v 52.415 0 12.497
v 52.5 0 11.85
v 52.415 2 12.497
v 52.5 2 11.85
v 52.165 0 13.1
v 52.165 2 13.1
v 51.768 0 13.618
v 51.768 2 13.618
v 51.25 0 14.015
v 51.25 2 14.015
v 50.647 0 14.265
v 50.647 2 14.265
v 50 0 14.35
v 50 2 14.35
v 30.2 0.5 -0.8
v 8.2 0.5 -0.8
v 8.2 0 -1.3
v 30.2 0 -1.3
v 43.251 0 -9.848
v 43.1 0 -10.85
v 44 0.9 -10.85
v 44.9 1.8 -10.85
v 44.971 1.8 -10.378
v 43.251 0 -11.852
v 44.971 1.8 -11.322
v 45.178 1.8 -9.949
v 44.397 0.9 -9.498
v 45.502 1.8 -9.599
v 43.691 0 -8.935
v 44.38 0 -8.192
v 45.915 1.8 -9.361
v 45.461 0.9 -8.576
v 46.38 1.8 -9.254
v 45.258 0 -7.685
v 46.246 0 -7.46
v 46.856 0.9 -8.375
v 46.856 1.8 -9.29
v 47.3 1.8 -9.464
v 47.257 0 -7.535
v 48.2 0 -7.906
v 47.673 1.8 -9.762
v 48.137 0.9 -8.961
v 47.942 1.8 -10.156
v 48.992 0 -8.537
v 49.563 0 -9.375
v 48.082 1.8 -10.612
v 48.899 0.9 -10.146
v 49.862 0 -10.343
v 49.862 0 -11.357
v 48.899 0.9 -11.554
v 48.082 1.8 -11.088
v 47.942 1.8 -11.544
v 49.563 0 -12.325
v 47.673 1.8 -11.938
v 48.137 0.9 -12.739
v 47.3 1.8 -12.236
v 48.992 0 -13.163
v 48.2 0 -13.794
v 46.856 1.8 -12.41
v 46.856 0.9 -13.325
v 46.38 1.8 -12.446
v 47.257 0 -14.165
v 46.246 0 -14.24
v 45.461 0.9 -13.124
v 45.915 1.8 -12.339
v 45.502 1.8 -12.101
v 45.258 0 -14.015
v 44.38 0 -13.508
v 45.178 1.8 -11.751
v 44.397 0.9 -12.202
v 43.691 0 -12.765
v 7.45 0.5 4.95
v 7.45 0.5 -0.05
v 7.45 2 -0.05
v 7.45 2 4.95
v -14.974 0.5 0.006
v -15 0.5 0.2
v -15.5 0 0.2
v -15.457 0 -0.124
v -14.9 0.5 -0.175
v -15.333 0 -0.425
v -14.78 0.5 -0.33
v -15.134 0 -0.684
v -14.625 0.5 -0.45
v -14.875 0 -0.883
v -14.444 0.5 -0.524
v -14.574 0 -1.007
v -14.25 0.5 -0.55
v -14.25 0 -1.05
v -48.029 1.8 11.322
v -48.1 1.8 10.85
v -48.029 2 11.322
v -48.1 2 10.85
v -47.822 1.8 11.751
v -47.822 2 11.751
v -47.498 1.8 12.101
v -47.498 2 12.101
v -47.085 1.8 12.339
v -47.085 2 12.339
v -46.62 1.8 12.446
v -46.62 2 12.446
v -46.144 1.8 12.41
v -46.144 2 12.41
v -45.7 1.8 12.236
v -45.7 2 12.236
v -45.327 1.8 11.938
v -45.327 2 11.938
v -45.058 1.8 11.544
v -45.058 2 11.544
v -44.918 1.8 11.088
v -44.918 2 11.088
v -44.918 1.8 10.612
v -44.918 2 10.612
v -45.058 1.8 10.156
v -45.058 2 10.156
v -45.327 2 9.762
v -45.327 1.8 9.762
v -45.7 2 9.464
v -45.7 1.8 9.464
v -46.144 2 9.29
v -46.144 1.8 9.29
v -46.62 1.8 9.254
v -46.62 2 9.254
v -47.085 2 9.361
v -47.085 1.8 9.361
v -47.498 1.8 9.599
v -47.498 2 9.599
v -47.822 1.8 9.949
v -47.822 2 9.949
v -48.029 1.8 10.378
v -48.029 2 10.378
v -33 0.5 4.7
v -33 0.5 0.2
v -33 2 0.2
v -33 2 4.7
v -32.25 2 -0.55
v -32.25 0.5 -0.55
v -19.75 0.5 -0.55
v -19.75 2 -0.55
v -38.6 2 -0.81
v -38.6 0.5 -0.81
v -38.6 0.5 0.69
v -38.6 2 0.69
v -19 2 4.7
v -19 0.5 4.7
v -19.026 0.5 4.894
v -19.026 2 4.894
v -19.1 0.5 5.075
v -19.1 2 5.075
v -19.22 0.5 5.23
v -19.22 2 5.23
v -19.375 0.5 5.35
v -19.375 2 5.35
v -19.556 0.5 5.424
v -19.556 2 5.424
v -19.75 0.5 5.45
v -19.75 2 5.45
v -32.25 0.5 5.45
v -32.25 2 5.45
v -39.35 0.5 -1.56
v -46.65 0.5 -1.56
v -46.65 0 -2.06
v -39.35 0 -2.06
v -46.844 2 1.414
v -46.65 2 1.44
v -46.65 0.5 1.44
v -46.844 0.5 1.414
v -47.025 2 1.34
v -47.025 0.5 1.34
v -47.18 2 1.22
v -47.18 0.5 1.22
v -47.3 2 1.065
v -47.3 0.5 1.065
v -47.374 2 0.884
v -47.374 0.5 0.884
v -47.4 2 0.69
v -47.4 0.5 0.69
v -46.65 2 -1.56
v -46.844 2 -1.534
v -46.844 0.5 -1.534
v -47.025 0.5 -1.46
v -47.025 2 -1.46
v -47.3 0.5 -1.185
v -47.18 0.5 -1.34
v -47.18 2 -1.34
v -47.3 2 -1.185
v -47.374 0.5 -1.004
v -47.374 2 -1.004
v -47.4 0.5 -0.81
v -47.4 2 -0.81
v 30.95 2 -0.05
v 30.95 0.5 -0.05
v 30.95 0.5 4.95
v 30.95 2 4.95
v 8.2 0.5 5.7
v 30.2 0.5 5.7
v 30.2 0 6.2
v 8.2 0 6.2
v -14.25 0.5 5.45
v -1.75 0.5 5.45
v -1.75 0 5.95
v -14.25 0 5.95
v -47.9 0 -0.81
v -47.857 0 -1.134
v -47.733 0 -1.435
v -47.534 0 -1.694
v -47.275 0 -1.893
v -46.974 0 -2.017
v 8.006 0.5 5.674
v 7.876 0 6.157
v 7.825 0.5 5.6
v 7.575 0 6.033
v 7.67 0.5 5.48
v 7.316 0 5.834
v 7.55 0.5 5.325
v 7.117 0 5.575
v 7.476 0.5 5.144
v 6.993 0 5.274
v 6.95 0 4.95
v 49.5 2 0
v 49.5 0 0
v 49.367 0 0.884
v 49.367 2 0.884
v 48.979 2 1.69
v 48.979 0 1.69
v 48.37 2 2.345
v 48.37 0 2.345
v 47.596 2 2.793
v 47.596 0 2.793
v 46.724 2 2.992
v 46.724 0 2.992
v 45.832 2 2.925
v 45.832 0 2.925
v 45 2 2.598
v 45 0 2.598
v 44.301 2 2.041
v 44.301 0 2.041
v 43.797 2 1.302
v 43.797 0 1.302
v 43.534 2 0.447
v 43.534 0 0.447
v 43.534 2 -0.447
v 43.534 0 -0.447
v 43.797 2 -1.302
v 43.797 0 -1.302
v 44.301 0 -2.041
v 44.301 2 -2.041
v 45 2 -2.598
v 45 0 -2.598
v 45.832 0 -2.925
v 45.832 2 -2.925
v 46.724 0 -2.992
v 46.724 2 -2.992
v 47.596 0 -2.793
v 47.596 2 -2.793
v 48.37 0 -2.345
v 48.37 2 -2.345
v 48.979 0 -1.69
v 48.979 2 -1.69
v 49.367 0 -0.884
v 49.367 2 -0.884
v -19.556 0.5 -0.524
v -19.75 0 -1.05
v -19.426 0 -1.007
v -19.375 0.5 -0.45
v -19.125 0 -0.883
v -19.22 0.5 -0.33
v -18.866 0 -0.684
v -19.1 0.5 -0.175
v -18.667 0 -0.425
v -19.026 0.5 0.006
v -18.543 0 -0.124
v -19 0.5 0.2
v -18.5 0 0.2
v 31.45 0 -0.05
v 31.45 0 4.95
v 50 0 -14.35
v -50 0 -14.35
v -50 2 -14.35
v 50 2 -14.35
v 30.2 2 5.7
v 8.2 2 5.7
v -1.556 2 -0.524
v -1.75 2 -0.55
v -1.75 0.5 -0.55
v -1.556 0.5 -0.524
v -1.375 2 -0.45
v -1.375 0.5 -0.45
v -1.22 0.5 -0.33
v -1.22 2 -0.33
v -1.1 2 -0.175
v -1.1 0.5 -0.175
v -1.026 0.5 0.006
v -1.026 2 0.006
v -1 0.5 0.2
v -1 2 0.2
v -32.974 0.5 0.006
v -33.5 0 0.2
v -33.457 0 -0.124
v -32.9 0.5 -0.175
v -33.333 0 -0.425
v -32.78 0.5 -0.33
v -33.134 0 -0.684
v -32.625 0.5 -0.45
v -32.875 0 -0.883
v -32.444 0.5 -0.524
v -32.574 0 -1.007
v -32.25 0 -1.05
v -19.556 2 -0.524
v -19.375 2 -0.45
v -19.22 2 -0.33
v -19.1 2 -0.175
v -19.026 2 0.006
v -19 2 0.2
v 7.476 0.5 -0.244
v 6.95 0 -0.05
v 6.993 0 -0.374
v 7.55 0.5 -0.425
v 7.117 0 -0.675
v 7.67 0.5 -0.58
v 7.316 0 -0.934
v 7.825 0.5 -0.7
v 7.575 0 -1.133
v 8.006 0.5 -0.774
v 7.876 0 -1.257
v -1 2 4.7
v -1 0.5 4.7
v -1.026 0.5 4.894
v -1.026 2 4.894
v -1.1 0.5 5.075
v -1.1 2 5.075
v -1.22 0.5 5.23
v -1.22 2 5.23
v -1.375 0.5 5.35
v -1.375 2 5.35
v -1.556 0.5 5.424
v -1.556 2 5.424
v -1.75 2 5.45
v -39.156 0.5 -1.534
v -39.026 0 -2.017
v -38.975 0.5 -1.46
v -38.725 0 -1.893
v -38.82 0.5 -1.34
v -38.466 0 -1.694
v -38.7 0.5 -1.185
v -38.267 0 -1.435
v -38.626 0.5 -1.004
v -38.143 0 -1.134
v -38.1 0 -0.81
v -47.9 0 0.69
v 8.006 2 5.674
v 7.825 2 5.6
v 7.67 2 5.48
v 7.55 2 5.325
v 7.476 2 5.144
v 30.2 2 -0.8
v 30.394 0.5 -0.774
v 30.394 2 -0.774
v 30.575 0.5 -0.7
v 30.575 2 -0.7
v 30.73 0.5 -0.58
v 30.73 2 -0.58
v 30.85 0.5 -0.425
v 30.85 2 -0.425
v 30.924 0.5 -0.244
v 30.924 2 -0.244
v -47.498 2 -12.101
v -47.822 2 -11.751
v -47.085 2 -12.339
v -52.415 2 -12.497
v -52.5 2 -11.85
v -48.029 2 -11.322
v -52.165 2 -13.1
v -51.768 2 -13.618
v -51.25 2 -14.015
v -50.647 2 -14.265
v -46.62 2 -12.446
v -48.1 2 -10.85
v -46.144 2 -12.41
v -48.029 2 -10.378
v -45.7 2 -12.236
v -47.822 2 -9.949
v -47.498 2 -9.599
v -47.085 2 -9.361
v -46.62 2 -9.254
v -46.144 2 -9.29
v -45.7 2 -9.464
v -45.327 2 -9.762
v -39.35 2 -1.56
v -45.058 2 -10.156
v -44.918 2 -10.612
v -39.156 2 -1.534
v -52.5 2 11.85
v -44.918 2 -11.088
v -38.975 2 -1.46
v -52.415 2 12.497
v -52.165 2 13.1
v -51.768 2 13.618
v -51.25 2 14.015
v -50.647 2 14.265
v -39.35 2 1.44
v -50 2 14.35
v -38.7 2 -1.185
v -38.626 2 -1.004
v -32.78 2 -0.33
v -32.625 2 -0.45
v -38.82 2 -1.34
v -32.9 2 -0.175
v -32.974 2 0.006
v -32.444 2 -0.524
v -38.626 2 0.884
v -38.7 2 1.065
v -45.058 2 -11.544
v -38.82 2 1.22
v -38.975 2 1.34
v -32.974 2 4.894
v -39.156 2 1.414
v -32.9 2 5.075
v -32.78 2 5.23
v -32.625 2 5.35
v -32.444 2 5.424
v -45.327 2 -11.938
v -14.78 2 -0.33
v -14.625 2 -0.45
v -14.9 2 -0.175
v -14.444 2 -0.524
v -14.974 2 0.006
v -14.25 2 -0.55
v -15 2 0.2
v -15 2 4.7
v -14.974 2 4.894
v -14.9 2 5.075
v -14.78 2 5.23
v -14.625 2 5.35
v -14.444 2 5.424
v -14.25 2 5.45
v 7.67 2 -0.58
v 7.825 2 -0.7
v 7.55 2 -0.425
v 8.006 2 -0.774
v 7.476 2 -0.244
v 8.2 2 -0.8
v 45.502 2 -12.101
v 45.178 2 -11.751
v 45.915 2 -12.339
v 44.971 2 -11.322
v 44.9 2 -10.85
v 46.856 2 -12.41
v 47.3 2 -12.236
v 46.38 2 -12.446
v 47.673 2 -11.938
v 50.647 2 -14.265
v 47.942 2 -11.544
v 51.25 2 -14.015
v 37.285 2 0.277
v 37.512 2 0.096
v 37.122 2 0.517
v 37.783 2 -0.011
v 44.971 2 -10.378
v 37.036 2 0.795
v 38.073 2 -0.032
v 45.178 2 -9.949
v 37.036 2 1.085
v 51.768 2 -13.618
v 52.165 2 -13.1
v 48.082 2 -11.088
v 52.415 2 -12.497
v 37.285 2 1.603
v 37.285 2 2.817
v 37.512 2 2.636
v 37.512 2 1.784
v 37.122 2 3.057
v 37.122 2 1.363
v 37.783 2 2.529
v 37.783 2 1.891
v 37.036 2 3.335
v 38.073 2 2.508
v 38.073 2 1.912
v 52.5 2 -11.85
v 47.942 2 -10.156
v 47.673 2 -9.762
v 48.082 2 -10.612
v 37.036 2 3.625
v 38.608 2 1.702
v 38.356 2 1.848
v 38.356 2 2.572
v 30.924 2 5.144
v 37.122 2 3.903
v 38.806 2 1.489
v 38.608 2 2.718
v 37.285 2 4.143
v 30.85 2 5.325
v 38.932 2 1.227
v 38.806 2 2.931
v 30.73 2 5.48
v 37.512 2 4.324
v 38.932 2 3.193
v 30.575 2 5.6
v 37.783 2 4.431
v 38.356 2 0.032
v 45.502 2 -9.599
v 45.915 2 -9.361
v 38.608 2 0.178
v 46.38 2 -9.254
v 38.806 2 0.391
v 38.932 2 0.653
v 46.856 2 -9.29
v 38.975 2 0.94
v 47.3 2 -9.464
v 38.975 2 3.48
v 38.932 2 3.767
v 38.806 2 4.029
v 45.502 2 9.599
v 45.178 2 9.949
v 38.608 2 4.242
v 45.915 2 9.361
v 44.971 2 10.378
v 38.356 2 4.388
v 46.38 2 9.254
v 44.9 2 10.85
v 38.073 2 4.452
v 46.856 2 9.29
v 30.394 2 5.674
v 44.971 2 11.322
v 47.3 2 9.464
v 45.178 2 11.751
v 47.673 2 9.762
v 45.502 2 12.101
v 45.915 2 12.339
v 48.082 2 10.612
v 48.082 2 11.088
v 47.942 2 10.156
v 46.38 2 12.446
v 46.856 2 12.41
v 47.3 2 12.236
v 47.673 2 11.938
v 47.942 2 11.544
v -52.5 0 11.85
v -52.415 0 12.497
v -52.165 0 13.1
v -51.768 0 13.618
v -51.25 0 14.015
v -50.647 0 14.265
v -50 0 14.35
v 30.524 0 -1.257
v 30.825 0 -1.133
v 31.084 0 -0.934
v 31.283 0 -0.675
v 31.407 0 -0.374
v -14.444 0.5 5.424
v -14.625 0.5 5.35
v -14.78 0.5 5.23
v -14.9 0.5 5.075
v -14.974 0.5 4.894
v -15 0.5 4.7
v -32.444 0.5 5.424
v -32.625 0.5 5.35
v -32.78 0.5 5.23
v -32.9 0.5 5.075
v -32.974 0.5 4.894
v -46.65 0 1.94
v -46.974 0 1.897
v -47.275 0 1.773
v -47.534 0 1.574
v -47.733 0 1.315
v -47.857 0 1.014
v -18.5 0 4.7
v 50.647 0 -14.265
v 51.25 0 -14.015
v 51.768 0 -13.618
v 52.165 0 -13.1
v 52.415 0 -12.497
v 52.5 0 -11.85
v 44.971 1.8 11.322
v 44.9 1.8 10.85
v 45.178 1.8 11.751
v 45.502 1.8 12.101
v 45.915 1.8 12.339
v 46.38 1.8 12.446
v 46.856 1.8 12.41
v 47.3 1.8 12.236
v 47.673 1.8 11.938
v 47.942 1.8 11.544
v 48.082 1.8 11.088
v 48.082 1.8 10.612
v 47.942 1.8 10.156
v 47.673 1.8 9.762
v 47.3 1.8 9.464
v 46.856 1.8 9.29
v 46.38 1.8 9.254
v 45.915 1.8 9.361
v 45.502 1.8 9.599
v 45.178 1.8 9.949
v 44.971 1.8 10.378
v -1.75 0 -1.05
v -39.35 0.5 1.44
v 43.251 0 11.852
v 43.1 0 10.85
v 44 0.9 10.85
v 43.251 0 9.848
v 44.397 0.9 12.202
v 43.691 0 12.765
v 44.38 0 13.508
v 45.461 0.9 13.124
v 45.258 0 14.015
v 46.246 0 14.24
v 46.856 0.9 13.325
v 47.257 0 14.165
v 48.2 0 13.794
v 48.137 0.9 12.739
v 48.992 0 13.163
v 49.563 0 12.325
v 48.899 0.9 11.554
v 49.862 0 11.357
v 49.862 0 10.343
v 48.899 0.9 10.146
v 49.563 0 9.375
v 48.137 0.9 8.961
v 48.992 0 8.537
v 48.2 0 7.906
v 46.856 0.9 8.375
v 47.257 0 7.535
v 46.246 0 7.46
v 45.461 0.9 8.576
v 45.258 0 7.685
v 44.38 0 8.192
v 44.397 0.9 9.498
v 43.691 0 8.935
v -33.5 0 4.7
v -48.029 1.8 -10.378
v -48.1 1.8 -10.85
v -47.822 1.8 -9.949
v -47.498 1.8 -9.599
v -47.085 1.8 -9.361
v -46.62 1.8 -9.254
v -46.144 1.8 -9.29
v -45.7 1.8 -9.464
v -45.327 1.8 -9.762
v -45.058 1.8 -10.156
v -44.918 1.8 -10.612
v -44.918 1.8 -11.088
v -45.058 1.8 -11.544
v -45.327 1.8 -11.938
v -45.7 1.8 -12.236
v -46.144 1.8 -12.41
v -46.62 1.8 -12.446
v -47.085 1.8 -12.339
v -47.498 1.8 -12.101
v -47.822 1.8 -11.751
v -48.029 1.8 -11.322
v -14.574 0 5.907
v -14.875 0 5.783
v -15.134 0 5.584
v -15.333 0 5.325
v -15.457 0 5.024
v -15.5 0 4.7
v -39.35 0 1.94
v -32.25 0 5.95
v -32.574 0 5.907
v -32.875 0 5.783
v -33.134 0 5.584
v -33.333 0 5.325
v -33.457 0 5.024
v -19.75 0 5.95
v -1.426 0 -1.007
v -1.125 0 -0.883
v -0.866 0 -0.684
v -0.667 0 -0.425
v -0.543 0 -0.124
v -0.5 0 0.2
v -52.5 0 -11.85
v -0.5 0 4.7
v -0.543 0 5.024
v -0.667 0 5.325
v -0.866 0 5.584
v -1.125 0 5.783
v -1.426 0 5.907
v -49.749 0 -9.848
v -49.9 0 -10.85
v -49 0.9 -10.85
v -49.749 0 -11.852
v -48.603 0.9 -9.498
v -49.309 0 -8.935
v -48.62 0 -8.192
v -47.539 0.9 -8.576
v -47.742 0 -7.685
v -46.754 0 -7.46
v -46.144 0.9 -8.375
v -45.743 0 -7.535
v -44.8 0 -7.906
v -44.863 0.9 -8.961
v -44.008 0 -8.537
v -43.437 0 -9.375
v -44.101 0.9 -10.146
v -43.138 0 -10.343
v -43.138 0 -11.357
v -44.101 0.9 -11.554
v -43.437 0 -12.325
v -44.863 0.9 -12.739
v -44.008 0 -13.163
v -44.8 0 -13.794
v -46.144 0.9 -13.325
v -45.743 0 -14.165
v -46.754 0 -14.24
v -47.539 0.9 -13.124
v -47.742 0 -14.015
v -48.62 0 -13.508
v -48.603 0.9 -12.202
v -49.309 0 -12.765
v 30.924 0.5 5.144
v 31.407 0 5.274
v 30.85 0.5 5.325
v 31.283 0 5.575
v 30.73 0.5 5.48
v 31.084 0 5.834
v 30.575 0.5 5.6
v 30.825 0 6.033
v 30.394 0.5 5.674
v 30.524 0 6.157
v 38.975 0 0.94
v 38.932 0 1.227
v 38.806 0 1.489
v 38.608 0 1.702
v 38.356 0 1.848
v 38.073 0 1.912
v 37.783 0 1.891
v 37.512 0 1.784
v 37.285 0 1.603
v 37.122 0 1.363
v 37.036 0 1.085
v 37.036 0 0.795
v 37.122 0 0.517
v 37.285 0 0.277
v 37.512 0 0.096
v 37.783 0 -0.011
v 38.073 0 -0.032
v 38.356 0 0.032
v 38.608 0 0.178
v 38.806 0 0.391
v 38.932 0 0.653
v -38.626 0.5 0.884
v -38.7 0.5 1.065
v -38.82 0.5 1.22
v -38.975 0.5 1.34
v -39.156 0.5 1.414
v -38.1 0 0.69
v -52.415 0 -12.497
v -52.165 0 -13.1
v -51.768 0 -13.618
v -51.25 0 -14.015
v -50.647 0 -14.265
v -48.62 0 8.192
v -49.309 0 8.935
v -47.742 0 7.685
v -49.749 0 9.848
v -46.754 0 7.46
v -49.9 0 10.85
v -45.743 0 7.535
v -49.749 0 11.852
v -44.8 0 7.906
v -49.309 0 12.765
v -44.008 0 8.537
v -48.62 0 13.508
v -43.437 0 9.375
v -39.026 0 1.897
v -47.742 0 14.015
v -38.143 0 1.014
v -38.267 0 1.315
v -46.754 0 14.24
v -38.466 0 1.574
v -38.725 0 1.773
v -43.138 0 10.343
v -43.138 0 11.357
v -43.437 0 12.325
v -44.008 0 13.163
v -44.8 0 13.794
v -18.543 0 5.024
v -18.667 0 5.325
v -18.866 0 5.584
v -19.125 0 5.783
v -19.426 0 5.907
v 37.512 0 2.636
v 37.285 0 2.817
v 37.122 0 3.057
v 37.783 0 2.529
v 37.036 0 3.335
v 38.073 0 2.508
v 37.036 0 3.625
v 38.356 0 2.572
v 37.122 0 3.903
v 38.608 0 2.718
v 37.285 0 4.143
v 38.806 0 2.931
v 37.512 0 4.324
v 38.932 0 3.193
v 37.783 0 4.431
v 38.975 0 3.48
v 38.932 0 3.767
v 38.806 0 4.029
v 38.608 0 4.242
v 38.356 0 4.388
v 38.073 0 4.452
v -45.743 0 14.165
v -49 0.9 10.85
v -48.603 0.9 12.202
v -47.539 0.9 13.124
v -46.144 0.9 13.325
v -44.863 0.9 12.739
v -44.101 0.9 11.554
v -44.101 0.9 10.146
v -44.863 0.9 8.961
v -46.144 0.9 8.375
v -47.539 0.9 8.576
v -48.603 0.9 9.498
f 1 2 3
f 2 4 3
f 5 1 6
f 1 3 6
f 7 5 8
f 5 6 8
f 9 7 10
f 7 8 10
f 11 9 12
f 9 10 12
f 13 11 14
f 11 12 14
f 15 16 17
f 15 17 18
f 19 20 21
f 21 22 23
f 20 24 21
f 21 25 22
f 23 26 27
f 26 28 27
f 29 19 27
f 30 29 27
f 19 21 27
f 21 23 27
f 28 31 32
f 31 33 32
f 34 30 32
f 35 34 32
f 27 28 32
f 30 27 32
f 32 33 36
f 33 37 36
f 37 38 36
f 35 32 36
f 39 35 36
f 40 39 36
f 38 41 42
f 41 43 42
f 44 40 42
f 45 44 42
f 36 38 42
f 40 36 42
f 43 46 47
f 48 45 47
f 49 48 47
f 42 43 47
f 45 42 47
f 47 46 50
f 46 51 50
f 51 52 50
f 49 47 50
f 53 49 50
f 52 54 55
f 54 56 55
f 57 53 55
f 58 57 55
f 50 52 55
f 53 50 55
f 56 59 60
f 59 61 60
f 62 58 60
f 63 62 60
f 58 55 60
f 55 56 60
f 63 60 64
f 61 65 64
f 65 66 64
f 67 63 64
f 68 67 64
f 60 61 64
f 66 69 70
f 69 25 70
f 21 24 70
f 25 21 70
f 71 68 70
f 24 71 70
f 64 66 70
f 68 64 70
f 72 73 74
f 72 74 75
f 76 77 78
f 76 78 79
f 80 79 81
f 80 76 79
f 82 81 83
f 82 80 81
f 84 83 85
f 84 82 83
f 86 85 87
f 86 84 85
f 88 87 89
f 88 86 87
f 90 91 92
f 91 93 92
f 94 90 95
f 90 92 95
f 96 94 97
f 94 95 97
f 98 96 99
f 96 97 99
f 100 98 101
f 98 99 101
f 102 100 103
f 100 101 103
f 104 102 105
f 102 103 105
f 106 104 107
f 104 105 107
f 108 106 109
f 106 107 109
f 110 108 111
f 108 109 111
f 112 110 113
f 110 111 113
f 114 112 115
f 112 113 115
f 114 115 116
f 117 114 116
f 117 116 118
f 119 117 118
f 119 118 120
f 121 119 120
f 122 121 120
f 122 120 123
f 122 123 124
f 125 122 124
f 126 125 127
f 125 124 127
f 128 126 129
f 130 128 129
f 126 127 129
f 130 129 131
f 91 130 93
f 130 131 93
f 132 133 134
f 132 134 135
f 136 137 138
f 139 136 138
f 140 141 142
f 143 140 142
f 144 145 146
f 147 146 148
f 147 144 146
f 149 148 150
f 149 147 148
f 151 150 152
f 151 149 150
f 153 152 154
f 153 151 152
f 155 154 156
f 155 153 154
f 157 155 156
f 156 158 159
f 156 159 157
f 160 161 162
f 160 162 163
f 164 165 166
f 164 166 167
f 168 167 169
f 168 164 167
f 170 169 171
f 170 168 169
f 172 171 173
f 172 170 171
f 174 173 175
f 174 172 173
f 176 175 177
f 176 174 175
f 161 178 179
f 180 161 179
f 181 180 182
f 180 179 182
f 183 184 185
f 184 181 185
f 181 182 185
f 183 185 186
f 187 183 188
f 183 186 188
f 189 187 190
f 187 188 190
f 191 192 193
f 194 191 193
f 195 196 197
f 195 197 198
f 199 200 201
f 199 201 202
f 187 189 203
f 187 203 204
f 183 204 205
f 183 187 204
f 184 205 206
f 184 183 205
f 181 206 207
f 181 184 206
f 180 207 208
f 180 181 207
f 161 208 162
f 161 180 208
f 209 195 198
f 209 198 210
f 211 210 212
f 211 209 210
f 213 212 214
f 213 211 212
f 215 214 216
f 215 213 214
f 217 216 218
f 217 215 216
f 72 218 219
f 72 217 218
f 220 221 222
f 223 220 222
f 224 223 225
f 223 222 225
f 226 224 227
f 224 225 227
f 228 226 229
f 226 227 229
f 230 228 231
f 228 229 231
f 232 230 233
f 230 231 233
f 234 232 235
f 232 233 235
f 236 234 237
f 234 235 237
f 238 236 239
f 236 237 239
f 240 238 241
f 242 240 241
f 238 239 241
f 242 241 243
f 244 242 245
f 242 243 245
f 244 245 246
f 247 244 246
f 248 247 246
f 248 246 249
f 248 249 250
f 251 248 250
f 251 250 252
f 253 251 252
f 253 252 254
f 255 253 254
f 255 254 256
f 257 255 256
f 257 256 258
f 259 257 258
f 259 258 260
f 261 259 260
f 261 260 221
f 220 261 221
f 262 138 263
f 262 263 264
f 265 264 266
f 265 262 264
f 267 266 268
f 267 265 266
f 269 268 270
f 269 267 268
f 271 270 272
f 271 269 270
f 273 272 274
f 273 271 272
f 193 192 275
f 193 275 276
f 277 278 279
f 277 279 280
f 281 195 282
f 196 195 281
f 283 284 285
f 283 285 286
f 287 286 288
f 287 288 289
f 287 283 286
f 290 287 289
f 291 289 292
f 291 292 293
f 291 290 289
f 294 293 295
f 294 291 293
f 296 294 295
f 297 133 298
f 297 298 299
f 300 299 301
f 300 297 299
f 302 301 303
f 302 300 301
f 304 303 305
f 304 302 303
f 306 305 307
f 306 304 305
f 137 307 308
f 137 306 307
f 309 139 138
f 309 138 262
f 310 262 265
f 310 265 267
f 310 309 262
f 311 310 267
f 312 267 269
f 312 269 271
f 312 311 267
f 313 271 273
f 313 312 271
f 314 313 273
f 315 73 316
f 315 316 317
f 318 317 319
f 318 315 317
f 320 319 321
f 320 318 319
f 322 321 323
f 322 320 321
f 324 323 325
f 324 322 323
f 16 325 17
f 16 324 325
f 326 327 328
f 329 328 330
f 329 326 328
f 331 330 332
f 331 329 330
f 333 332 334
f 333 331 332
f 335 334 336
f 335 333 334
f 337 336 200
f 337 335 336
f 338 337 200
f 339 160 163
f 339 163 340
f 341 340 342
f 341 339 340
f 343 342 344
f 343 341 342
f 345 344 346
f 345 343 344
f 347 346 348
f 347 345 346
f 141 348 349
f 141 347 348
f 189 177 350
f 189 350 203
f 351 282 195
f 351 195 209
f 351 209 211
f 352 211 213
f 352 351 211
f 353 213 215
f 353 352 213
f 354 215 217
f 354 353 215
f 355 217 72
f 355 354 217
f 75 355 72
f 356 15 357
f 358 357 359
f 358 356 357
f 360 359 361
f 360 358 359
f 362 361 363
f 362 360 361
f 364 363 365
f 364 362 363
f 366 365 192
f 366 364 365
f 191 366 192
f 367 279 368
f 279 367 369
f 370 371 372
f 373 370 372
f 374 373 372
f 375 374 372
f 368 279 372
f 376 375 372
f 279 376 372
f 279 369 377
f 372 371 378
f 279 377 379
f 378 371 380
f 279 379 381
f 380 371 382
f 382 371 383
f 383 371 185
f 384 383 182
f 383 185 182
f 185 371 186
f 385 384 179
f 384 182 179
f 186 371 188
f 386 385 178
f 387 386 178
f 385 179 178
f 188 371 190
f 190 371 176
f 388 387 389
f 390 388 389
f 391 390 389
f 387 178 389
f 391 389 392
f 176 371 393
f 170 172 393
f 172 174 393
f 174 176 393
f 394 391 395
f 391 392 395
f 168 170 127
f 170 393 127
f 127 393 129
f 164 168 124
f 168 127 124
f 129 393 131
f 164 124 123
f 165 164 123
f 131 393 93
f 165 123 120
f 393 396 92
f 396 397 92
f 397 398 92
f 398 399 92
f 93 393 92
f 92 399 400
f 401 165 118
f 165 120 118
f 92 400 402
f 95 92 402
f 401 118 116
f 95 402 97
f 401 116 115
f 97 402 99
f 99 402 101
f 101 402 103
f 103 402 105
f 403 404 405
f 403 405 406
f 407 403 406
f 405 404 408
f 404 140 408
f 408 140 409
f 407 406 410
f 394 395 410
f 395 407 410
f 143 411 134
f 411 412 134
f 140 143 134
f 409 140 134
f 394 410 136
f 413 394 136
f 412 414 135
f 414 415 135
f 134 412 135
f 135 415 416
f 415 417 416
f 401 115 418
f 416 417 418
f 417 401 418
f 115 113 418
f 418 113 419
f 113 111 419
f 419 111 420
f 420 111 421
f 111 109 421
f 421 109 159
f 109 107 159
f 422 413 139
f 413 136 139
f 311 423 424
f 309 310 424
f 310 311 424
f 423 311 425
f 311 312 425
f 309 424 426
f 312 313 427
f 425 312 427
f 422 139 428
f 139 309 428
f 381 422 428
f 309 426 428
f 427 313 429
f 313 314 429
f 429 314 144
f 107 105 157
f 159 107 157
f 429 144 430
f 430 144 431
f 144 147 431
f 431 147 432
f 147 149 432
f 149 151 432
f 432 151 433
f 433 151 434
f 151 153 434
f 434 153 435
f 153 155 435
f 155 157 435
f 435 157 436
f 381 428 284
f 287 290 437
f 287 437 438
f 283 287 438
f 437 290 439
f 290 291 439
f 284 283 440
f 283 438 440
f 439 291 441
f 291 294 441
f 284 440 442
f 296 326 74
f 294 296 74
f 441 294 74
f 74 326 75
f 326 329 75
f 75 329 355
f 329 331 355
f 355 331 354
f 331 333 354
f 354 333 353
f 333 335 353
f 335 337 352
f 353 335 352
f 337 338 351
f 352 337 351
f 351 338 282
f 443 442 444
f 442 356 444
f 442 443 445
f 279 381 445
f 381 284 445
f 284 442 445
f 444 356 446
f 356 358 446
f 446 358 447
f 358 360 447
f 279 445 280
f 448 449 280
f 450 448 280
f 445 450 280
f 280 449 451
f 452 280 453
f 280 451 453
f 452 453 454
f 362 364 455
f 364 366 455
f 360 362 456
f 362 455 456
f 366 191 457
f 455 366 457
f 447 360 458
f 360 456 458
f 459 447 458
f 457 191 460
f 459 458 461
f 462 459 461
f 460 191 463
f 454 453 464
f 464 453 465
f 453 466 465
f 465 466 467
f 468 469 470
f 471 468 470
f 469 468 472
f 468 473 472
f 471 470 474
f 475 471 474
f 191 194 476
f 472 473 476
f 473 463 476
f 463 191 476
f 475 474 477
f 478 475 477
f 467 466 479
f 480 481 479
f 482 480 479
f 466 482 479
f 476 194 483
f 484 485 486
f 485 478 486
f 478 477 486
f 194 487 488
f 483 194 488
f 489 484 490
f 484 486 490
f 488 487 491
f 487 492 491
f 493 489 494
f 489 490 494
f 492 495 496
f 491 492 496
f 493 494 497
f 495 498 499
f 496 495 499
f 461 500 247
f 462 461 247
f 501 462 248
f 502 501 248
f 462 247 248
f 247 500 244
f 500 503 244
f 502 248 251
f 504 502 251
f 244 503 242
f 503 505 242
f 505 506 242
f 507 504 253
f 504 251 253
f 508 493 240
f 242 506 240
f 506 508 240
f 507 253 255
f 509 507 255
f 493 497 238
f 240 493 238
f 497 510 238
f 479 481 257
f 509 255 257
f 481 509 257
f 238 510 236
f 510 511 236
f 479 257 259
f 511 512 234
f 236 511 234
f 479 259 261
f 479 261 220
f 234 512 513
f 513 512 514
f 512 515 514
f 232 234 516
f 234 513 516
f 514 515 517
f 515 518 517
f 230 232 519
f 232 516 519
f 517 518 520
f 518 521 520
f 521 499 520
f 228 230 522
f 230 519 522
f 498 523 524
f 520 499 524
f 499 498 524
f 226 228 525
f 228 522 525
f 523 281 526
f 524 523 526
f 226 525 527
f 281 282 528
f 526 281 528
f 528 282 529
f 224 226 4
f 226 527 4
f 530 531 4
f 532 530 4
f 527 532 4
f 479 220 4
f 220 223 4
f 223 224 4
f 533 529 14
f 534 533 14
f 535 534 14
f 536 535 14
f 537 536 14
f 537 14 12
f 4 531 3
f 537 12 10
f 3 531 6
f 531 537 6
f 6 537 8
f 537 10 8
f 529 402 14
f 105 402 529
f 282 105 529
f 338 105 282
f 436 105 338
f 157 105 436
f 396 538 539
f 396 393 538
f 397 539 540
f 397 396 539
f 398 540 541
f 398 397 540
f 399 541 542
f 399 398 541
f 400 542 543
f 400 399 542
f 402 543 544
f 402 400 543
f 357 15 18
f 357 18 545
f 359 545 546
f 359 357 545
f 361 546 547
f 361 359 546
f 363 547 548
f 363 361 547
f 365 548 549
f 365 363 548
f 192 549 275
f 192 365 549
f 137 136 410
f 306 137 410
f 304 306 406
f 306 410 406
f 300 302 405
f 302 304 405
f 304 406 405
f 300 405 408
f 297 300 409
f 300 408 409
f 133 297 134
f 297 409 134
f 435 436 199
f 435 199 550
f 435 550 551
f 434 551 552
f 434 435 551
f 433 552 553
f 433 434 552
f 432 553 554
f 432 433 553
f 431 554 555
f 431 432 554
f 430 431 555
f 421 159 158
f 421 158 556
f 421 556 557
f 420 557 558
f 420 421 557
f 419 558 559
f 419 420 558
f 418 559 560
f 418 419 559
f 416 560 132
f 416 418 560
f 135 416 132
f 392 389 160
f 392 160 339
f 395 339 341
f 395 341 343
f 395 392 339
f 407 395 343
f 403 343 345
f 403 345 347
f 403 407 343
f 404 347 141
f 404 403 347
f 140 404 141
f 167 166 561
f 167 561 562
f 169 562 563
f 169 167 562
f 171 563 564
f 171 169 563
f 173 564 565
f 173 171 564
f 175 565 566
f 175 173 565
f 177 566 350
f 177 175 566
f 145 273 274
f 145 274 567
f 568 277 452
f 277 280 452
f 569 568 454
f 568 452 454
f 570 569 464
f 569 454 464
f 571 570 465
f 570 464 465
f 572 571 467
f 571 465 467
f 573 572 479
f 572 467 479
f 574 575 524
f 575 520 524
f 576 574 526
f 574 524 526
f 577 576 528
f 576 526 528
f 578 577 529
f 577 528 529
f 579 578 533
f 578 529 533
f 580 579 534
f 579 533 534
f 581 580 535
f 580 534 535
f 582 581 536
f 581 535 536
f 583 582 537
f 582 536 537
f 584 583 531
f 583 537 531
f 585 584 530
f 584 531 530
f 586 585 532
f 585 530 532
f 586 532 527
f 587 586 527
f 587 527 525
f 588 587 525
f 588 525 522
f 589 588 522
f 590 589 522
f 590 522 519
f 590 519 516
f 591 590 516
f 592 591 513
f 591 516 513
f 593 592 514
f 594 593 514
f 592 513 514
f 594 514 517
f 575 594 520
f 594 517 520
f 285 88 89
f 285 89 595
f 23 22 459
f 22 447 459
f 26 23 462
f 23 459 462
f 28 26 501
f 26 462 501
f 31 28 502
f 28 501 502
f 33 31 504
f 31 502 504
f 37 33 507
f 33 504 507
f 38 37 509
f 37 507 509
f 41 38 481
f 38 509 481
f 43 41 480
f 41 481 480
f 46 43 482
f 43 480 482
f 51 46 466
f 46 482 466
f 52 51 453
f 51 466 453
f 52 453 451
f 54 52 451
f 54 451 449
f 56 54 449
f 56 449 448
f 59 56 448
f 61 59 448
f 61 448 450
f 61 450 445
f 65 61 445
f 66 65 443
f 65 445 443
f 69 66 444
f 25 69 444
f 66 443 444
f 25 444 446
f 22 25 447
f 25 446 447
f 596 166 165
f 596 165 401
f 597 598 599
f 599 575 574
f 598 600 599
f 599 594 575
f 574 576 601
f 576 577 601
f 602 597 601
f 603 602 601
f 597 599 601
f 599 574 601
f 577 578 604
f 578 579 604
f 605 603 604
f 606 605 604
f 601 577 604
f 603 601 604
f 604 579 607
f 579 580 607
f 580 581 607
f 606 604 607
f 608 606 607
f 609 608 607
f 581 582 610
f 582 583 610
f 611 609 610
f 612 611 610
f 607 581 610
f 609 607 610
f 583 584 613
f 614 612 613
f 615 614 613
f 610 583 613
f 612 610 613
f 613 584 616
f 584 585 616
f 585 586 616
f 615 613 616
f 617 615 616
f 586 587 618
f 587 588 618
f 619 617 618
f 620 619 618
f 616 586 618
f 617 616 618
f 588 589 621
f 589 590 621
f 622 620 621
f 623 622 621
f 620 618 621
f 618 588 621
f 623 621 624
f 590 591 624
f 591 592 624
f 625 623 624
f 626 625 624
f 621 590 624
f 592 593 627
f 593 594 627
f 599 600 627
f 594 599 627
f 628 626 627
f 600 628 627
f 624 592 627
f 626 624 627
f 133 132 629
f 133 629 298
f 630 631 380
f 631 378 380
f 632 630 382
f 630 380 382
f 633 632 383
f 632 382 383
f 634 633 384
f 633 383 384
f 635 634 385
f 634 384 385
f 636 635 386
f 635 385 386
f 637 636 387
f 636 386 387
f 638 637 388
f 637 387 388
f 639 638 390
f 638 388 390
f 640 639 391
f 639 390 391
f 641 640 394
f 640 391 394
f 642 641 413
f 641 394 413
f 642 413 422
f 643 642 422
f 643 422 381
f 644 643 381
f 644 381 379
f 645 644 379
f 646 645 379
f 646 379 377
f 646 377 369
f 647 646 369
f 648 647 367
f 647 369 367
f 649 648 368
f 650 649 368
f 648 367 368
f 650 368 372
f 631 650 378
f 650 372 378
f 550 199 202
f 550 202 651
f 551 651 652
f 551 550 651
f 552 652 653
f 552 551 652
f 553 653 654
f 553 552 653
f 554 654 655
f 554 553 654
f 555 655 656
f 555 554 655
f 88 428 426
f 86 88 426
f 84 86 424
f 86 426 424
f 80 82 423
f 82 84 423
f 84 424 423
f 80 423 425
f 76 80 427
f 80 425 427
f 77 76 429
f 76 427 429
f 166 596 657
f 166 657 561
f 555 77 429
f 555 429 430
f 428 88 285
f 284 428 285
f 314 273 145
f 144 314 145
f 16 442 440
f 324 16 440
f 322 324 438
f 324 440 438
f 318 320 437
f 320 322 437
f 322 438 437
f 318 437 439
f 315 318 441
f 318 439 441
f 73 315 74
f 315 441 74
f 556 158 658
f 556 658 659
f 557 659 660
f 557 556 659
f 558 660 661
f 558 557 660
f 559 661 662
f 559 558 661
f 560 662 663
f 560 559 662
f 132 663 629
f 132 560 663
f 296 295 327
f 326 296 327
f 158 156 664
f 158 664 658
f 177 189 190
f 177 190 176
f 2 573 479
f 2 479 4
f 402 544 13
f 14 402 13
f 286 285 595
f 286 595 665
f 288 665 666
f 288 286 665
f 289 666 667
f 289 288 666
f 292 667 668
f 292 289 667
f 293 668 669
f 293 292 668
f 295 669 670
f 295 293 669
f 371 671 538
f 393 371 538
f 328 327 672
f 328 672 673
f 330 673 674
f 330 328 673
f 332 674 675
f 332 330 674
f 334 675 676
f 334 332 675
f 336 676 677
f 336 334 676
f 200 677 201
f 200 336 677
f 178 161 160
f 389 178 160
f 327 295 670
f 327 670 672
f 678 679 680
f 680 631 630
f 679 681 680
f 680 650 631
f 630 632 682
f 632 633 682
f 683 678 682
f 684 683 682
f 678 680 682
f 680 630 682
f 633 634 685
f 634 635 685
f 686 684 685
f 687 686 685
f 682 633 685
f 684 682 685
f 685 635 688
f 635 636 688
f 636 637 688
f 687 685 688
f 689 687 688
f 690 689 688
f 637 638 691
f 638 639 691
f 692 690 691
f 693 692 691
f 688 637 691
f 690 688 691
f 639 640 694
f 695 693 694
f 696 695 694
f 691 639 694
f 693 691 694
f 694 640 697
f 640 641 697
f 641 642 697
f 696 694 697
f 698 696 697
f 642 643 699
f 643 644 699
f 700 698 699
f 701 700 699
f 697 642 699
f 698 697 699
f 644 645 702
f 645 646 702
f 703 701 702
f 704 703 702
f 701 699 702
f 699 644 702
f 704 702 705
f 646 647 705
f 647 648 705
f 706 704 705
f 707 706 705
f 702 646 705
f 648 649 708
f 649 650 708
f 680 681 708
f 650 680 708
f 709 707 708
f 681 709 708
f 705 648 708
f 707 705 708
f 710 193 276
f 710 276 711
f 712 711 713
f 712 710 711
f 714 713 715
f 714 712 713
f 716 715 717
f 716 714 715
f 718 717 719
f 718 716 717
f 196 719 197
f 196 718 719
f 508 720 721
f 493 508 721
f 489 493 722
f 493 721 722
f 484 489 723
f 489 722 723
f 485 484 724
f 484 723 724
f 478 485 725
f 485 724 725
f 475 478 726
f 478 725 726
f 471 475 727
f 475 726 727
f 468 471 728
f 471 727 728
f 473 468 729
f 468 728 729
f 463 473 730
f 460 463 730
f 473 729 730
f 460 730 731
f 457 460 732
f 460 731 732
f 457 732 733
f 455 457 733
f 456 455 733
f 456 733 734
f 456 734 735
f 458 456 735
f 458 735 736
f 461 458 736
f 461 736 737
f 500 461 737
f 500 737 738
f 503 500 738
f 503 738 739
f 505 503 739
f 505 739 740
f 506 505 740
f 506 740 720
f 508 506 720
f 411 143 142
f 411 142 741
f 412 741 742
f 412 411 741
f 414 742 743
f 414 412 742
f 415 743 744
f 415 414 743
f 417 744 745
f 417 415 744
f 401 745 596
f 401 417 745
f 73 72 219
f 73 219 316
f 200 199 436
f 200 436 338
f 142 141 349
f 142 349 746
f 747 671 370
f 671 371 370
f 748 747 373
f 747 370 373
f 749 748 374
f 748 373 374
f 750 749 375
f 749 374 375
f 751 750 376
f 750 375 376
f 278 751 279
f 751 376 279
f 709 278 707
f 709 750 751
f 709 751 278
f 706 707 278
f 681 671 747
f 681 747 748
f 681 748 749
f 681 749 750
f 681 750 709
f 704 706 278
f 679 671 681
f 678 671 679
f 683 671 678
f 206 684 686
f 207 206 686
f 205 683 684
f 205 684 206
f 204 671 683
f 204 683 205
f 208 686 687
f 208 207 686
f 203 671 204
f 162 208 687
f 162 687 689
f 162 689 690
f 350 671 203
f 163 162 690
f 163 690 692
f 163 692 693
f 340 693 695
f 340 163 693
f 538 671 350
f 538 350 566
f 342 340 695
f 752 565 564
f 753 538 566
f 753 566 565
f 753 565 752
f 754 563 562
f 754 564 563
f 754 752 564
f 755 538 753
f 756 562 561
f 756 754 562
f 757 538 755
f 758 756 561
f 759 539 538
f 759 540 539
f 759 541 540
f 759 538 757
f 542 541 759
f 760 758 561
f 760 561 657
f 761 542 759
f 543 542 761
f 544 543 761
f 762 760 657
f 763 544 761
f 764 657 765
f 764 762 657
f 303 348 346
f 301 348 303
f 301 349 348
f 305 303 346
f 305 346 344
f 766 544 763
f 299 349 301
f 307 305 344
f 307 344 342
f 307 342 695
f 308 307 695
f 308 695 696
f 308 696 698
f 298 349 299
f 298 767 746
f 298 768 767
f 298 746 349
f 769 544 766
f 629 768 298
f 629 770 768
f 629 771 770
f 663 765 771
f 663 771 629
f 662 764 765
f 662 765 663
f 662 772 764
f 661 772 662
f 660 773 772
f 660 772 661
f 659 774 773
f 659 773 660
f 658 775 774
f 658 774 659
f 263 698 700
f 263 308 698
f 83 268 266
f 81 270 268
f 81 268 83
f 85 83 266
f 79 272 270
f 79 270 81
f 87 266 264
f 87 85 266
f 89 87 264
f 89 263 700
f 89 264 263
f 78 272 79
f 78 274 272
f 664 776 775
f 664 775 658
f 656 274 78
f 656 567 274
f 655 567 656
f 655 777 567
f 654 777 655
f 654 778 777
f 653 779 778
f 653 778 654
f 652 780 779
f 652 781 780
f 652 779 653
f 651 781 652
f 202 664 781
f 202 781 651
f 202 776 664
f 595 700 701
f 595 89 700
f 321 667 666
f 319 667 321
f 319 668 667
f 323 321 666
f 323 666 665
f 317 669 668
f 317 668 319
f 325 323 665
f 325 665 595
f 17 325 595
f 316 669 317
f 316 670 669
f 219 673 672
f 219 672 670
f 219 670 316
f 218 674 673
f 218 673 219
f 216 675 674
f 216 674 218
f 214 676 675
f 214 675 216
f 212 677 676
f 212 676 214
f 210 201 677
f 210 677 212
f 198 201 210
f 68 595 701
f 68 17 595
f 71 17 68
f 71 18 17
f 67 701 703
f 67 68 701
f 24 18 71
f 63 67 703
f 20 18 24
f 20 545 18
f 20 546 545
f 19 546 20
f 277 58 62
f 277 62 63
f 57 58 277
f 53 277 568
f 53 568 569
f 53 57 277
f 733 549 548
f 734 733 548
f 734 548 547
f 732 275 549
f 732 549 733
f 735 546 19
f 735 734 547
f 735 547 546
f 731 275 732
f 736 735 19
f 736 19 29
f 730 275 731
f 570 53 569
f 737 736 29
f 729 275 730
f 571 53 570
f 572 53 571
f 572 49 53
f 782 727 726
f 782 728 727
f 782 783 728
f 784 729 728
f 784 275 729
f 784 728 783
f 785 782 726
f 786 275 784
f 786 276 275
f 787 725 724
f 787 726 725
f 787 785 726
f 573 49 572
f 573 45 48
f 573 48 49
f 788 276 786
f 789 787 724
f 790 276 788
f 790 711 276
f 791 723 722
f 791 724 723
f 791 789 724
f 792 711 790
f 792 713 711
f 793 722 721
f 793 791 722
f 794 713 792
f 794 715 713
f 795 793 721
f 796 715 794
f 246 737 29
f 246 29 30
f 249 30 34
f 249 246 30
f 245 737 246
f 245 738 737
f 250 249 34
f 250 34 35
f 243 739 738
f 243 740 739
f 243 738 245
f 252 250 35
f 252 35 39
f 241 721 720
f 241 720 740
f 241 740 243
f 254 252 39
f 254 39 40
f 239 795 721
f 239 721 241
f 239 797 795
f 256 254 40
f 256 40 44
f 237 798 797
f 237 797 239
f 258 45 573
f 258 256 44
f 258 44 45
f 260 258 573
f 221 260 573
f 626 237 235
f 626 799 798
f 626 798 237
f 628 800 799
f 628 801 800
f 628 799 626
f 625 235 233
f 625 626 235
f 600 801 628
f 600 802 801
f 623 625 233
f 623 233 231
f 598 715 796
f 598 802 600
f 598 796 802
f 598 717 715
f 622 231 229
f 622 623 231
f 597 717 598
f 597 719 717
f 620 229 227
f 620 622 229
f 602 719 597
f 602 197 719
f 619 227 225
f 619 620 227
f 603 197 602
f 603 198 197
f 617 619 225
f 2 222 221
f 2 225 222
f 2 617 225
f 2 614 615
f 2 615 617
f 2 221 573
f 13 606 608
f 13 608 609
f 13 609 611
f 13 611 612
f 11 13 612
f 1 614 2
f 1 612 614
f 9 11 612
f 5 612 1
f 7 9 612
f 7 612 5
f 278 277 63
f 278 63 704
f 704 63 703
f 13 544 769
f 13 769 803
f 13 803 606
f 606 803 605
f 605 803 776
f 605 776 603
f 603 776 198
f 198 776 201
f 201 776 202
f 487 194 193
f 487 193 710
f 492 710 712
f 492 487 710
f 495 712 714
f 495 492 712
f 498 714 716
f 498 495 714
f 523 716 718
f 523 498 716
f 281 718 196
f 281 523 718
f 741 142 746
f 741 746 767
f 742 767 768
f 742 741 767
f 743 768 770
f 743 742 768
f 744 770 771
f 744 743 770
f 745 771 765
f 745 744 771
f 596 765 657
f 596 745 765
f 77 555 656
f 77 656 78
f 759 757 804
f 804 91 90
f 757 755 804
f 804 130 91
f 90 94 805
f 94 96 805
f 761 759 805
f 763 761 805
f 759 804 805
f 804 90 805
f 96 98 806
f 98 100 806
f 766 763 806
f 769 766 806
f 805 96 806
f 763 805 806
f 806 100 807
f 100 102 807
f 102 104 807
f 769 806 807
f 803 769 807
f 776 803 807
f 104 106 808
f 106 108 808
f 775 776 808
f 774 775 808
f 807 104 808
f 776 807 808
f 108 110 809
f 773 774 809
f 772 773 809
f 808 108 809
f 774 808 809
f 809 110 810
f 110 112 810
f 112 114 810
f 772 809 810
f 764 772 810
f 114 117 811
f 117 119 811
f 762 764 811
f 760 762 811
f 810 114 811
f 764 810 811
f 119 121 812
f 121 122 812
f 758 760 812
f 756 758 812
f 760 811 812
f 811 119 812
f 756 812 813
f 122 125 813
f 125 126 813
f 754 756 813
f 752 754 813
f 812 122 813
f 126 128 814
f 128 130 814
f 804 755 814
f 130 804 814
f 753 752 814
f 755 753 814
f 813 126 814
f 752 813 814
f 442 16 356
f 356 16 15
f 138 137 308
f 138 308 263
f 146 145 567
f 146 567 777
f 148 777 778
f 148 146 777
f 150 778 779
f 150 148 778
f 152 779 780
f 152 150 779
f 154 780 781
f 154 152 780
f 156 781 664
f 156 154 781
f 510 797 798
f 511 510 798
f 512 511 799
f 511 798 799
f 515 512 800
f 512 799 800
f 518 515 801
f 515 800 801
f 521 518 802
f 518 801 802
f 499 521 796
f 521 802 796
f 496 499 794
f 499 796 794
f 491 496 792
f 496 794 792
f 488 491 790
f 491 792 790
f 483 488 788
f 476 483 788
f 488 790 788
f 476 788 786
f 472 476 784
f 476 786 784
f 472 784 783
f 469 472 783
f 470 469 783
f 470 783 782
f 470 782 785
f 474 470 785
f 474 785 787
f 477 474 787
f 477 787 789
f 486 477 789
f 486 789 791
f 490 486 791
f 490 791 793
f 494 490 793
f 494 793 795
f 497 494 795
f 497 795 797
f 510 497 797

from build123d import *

# Parameters (mm, degrees)
SKETCH_W         = 105
SKETCH_H         = 28.7
PAD_DEPTH        = 2
FILLET_R         = 2.5
HOLE_D           = 3.2
HOLE_DEPTH       = 25
HOLE_CSINK_D     = 6.8
HOLE_CSINK_ANGLE = 90
SKETCH002_W      = 8.8
SKETCH002_H      = 3
SKETCH002_W_2    = 14
SKETCH002_H_2    = 6
SKETCH002_W_3    = 23.5
SKETCH002_H_3    = 6.5
POCKET_DEPTH     = 2.001
FILLET001_R      = 0.75
CHAMFER_SIZE     = 0.5
SKETCH003_R      = 0.975
HOLE001_DEPTH    = 25
SKETCH004_R      = 3
HOLE002_DEPTH    = 25


with BuildPart() as part:
    # Sketch → Pad (new body)
    with BuildSketch(Plane.XZ):
        Rectangle(SKETCH_W, SKETCH_H)
    extrude(amount=-PAD_DEPTH)

    # Fillet
    fillet_edges = [part.edges().sort_by_distance(p)[0] for p in [
        (52.5, 1, 14.35),
        (52.5, 1, -14.35),
        (-52.5, 1, 14.35),
        (-52.5, 1, -14.35),
    ]]
    fillet(fillet_edges, radius=FILLET_R)

    # Hole
    with Locations(Plane.XZ):
        with Locations((46.5, 10.85), (46.5, -10.85), (-46.5, -10.85), (-46.5, 10.85)):
            CounterSinkHole(HOLE_D / 2, HOLE_CSINK_D / 2, depth=HOLE_DEPTH, counter_sink_angle=HOLE_CSINK_ANGLE)

    # Sketch002 → Pocket (cut, through all)
    with BuildSketch(Plane.XZ):
        with Locations((-43, -0.06)):
            Rectangle(SKETCH002_W, SKETCH002_H)
        with Locations((-26, 2.45)):
            Rectangle(SKETCH002_W_2, SKETCH002_H_2)
        with Locations((-8, 2.45)):
            Rectangle(SKETCH002_W_2, SKETCH002_H_2)
        with Locations((19.2, 2.45)):
            Rectangle(SKETCH002_W_3, SKETCH002_H_3)
    extrude(amount=-POCKET_DEPTH, mode=Mode.SUBTRACT)

    # Fillet001
    fillet001_edges = [part.edges().sort_by_distance(p)[0] for p in [
        (-19, 1, -0.55),
        (-1, 1, -0.55),
        (30.95, 1, -0.8),
        (-33, 1, -0.55),
        (-47.4, 1, -1.56),
        (-15, 1, -0.55),
        (7.45, 1, -0.8),
        (-38.6, 1, -1.56),
        (-47.4, 1, 1.44),
        (-33, 1, 5.45),
        (-15, 1, 5.45),
        (7.45, 1, 5.7),
        (30.95, 1, 5.7),
        (-1, 1, 5.45),
        (-19, 1, 5.45),
        (-38.6, 1, 1.44),
    ]]
    fillet(fillet001_edges, radius=FILLET001_R)

    # Chamfer
    chamfer_edges = [part.edges().sort_by_distance(p)[0] for p in [
        (19.2, 0, -0.8),
        (-8, 0, -0.55),
        (-26, 0, -0.55),
        (-43, 0, -1.56),
    ]]
    chamfer(chamfer_edges, length=CHAMFER_SIZE)

    # Sketch003 → Hole001 (cut)
    with BuildSketch(Plane.XZ):
        with Locations((38, 0.94)):
            Circle(SKETCH003_R)
        with Locations((38, 3.48)):
            Circle(SKETCH003_R)
    extrude(amount=-HOLE001_DEPTH, mode=Mode.SUBTRACT)

    # Sketch004 → Hole002 (cut)
    with BuildSketch(Plane.XZ):
        with Locations((46.5, 0)):
            Circle(SKETCH004_R)
    extrude(amount=-HOLE002_DEPTH, mode=Mode.SUBTRACT)


solid = part.part
